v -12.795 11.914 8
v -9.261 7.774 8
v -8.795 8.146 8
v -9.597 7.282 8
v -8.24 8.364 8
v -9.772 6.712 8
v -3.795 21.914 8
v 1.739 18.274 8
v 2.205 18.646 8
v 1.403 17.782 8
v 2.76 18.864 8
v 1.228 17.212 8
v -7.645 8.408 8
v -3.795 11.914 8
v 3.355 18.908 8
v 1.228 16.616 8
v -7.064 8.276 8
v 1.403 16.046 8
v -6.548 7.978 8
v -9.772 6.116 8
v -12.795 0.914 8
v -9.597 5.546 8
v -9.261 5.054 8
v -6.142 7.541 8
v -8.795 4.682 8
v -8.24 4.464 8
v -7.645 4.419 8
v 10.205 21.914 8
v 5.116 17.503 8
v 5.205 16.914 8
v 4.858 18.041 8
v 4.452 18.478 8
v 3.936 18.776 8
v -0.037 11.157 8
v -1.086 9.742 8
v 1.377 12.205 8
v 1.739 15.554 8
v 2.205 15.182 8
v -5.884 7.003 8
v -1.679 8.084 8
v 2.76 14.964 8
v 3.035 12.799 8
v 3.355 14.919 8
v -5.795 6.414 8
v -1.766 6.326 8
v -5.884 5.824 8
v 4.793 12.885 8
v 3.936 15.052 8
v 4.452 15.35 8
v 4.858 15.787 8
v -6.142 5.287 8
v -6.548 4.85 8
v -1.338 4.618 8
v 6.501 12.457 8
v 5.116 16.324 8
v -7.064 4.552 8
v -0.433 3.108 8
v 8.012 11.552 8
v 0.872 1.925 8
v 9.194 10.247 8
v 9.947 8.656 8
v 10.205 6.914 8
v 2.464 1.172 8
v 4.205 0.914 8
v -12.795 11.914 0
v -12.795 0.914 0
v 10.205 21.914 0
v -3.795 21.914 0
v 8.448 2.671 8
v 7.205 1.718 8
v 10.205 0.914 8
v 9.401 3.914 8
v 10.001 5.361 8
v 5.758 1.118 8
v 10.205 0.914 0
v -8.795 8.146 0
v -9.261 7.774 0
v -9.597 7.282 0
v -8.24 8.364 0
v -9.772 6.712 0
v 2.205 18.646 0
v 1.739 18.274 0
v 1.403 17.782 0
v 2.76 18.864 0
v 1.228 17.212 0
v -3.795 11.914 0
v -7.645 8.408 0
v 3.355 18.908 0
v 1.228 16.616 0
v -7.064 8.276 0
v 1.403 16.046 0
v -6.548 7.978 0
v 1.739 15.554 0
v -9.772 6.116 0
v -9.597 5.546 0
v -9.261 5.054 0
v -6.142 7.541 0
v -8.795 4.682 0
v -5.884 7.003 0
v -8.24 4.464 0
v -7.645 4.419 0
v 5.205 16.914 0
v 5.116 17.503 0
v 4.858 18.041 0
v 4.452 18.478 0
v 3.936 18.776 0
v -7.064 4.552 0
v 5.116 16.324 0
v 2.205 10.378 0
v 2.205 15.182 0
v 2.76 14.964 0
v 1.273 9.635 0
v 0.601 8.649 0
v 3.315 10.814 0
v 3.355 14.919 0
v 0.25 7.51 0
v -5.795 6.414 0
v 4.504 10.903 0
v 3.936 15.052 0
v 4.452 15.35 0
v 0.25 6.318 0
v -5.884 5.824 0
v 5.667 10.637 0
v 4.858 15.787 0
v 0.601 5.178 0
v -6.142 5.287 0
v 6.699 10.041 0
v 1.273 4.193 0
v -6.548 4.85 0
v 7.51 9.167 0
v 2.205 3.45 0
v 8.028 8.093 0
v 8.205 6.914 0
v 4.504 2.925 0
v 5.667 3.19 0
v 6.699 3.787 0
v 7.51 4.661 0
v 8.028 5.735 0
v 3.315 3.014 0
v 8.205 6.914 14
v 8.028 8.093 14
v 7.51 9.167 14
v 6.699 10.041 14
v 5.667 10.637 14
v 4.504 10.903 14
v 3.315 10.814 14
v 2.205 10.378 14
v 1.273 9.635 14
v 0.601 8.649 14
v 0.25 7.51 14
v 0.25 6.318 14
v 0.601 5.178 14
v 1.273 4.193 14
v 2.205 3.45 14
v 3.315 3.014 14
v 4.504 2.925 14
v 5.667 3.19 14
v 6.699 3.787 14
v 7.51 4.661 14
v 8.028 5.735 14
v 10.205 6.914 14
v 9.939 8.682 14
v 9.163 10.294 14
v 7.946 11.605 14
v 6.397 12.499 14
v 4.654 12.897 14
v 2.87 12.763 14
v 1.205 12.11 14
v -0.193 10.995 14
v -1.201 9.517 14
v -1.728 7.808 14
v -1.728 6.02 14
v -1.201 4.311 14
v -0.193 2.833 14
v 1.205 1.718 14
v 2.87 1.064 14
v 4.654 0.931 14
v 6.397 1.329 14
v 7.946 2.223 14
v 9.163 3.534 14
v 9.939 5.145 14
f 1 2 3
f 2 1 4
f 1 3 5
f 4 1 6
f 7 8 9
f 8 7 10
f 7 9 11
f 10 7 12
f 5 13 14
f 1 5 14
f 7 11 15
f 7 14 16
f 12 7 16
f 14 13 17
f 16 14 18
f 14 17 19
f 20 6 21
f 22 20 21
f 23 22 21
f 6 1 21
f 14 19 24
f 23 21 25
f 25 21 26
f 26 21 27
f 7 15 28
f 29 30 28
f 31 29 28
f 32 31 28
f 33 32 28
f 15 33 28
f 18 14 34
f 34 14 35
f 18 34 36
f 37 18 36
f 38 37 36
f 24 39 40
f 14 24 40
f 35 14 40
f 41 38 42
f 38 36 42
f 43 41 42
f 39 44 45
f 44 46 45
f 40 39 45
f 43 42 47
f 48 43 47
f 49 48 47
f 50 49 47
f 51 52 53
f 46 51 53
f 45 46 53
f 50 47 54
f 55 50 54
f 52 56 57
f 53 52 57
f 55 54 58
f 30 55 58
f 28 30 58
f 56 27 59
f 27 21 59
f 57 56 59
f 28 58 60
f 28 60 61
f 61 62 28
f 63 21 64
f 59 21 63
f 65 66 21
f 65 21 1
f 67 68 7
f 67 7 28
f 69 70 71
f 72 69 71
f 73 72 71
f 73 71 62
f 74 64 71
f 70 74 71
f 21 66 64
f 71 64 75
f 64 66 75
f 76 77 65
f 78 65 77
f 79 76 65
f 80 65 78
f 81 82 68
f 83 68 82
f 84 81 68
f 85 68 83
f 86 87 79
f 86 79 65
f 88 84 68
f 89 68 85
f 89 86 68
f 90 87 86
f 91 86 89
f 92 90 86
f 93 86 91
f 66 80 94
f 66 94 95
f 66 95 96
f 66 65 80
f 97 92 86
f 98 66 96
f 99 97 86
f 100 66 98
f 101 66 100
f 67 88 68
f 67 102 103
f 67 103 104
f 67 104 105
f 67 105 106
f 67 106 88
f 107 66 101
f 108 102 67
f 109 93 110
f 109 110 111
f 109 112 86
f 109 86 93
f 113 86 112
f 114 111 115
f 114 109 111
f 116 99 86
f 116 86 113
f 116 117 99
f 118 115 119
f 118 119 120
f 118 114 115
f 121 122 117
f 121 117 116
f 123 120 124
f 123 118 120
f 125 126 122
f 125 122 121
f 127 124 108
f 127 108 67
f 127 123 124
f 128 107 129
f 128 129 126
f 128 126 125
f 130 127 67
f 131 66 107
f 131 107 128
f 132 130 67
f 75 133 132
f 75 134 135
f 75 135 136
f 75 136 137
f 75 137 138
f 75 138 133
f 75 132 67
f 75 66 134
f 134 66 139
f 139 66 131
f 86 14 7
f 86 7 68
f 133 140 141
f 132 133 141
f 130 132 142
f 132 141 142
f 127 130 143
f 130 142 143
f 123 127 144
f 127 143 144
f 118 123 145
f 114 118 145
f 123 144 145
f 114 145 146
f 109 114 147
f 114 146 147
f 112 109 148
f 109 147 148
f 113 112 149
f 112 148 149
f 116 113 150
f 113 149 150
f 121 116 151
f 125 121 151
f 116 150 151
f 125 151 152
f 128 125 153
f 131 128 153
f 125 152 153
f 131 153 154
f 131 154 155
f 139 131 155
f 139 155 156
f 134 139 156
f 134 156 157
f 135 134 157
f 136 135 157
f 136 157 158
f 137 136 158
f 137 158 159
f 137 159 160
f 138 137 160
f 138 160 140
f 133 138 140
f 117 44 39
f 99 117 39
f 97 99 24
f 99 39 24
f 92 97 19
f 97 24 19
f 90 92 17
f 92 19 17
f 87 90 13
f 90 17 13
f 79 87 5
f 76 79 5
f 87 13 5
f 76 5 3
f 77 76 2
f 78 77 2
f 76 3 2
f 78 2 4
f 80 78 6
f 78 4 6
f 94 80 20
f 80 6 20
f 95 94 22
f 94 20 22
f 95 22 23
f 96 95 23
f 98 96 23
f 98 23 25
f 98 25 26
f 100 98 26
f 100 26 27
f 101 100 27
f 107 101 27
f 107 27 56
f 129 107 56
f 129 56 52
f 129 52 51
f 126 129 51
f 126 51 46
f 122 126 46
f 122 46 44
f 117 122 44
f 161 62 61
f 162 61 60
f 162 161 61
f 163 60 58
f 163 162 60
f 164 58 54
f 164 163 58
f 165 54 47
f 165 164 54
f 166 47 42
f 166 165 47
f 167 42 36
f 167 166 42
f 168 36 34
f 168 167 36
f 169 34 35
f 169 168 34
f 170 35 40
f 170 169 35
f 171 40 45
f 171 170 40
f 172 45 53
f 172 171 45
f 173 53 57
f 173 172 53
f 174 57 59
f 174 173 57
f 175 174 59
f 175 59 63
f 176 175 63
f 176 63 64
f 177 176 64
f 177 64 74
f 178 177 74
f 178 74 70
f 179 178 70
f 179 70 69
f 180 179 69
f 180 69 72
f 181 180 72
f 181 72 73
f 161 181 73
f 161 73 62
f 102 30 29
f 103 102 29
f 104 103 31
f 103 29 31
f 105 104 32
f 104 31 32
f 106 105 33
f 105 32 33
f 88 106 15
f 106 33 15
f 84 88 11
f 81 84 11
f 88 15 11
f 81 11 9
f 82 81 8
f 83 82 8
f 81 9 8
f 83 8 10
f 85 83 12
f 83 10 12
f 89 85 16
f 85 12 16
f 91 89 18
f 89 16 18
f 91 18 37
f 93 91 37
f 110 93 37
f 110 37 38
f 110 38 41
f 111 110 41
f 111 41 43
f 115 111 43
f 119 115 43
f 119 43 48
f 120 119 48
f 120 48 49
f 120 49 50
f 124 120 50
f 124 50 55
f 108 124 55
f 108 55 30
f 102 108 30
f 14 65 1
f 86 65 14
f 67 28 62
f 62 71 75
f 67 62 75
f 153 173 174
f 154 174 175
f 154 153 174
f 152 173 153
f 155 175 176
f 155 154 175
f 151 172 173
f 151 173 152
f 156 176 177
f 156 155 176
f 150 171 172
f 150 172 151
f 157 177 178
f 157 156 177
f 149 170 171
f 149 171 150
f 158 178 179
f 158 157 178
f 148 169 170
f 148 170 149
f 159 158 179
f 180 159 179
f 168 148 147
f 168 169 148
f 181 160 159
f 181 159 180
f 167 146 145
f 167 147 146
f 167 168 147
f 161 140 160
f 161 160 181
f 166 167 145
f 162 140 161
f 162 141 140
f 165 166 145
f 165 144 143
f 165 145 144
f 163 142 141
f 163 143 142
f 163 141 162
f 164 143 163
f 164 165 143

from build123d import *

# Parameters (mm, degrees)
SKETCH1_W           = 23
SKETCH1_H           = 11
BOSS_EXTRUDE1_DEPTH = 8
SKETCH2_W           = 14
SKETCH2_H           = 8
BOSS_EXTRUDE2_DEPTH = 10
SKETCH3_R           = 2
CUT_EXTRUDE1_DEPTH  = 20
SKETCH4_R           = 4
CUT_EXTRUDE2_DEPTH  = 20
BOSS_EXTRUDE3_START = 6
SKETCH5_R           = 6
SKETCH5_R_2         = 4
BOSS_EXTRUDE3_DEPTH = 6


with BuildPart() as part:
    # Sketch1 → Boss-Extrude1 (new body)
    with BuildSketch(Plane.XY):
        with Locations((-1.294701987, 6.413907285)):
            Rectangle(SKETCH1_W, SKETCH1_H)
    extrude(amount=BOSS_EXTRUDE1_DEPTH)

    # Sketch2 → Boss-Extrude2 (add)
    with BuildSketch(Plane(origin=(0, 11.913907285, 0), x_dir=(1, 0, 0), z_dir=(0, 1, 0))):
        with Locations((3.205298013, -4)):
            Rectangle(SKETCH2_W, SKETCH2_H)
    extrude(amount=BOSS_EXTRUDE2_DEPTH)

    # Sketch3 → Cut-Extrude1 (cut)
    with BuildSketch(Plane.XY.offset(8)):
        with Locations((-7.794701987, 6.413907285)):
            Circle(SKETCH3_R)
        with Locations((3.205298013, 16.913907285)):
            Circle(SKETCH3_R)
    extrude(amount=-CUT_EXTRUDE1_DEPTH, mode=Mode.SUBTRACT)

    # Sketch4 → Cut-Extrude2 (cut)
    with BuildSketch(Plane.XY.offset(8)):
        with Locations((4.205298013, 6.913907285)):
            Circle(SKETCH4_R)
    extrude(amount=-CUT_EXTRUDE2_DEPTH, mode=Mode.SUBTRACT)

    # Sketch5 → Boss-Extrude3 (add)
    with BuildSketch(Plane.XY.offset(8).offset(BOSS_EXTRUDE3_START)):
        with Locations((4.205298013, 6.913907285)):
            Circle(SKETCH5_R)
        with Locations((4.205298013, 6.913907285)):
            Circle(SKETCH5_R_2, mode=Mode.SUBTRACT)
    extrude(amount=-BOSS_EXTRUDE3_DEPTH)


solid = part.part
